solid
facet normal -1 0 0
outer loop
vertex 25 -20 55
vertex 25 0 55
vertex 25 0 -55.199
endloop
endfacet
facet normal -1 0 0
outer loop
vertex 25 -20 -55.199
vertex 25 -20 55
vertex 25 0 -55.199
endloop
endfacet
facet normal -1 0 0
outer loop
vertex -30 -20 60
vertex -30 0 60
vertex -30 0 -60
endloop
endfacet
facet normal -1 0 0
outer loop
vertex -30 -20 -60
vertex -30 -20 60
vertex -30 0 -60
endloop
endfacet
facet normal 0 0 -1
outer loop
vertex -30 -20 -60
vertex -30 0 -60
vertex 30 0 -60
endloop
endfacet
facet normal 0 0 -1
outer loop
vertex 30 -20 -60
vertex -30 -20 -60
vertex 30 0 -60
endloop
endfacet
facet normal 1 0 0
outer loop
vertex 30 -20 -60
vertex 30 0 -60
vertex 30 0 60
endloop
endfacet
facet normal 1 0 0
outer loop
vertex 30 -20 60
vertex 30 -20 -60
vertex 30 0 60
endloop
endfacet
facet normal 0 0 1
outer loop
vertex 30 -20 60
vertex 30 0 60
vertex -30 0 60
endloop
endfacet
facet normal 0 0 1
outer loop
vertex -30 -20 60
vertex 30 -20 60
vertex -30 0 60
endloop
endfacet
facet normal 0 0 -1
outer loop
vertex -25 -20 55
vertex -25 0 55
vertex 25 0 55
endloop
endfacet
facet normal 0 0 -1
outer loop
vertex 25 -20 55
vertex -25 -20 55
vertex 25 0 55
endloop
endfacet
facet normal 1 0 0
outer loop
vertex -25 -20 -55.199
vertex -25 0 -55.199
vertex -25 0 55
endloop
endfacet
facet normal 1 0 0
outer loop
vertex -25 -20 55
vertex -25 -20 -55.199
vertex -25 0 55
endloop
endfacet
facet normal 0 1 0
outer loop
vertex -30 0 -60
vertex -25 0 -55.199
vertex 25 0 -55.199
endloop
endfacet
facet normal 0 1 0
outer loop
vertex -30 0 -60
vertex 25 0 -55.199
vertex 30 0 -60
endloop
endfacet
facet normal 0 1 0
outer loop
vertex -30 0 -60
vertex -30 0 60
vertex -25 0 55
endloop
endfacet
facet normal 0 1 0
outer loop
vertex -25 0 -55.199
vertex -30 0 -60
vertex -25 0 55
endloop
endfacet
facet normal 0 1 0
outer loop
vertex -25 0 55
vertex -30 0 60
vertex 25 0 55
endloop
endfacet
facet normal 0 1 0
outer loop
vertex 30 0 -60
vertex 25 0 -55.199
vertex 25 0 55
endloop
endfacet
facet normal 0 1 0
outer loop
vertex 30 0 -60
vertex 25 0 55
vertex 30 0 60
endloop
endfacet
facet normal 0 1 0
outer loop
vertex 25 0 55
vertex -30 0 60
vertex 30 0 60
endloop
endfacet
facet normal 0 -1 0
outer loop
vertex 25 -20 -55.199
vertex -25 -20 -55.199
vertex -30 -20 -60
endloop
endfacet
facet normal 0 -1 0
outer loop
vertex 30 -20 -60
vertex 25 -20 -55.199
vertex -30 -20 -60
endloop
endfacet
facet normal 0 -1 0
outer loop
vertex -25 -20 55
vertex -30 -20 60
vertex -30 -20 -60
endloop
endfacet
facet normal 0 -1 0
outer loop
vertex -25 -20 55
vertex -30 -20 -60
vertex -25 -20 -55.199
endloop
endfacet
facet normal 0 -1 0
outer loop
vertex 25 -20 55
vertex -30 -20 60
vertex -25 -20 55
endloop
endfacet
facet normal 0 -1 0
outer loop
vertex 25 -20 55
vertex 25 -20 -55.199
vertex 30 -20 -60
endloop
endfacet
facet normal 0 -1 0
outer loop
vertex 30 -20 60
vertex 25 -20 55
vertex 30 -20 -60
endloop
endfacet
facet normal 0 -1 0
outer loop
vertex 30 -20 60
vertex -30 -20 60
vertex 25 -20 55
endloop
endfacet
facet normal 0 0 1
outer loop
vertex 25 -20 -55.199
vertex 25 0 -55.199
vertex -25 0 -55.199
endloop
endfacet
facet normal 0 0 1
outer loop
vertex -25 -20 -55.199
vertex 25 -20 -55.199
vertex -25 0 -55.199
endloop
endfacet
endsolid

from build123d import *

# Parameters (mm, degrees)
F2_DEPTH = 20


with BuildPart() as f2:
    # F0 (on Front) → F2 (new body)
    with BuildSketch(Plane.XZ):
        Polygon((-25, 0), (-30, 0), (-30, -60), (0, -60), (0, -55.198602), (-25, -55.198602), align=None)
        Polygon((0, 55), (0, 60), (-30, 60), (-30, 0), (-25, 0), (-25, 55), align=None)
        Polygon((30, 60), (0, 60), (0, 55), (25, 55), (25, 0), (30, 0), align=None)
        Polygon((30, -60), (30, 0), (25, 0), (25, -55.198602), (0, -55.198602), (0, -60), align=None)
    extrude(amount=F2_DEPTH)


solid = f2.part
